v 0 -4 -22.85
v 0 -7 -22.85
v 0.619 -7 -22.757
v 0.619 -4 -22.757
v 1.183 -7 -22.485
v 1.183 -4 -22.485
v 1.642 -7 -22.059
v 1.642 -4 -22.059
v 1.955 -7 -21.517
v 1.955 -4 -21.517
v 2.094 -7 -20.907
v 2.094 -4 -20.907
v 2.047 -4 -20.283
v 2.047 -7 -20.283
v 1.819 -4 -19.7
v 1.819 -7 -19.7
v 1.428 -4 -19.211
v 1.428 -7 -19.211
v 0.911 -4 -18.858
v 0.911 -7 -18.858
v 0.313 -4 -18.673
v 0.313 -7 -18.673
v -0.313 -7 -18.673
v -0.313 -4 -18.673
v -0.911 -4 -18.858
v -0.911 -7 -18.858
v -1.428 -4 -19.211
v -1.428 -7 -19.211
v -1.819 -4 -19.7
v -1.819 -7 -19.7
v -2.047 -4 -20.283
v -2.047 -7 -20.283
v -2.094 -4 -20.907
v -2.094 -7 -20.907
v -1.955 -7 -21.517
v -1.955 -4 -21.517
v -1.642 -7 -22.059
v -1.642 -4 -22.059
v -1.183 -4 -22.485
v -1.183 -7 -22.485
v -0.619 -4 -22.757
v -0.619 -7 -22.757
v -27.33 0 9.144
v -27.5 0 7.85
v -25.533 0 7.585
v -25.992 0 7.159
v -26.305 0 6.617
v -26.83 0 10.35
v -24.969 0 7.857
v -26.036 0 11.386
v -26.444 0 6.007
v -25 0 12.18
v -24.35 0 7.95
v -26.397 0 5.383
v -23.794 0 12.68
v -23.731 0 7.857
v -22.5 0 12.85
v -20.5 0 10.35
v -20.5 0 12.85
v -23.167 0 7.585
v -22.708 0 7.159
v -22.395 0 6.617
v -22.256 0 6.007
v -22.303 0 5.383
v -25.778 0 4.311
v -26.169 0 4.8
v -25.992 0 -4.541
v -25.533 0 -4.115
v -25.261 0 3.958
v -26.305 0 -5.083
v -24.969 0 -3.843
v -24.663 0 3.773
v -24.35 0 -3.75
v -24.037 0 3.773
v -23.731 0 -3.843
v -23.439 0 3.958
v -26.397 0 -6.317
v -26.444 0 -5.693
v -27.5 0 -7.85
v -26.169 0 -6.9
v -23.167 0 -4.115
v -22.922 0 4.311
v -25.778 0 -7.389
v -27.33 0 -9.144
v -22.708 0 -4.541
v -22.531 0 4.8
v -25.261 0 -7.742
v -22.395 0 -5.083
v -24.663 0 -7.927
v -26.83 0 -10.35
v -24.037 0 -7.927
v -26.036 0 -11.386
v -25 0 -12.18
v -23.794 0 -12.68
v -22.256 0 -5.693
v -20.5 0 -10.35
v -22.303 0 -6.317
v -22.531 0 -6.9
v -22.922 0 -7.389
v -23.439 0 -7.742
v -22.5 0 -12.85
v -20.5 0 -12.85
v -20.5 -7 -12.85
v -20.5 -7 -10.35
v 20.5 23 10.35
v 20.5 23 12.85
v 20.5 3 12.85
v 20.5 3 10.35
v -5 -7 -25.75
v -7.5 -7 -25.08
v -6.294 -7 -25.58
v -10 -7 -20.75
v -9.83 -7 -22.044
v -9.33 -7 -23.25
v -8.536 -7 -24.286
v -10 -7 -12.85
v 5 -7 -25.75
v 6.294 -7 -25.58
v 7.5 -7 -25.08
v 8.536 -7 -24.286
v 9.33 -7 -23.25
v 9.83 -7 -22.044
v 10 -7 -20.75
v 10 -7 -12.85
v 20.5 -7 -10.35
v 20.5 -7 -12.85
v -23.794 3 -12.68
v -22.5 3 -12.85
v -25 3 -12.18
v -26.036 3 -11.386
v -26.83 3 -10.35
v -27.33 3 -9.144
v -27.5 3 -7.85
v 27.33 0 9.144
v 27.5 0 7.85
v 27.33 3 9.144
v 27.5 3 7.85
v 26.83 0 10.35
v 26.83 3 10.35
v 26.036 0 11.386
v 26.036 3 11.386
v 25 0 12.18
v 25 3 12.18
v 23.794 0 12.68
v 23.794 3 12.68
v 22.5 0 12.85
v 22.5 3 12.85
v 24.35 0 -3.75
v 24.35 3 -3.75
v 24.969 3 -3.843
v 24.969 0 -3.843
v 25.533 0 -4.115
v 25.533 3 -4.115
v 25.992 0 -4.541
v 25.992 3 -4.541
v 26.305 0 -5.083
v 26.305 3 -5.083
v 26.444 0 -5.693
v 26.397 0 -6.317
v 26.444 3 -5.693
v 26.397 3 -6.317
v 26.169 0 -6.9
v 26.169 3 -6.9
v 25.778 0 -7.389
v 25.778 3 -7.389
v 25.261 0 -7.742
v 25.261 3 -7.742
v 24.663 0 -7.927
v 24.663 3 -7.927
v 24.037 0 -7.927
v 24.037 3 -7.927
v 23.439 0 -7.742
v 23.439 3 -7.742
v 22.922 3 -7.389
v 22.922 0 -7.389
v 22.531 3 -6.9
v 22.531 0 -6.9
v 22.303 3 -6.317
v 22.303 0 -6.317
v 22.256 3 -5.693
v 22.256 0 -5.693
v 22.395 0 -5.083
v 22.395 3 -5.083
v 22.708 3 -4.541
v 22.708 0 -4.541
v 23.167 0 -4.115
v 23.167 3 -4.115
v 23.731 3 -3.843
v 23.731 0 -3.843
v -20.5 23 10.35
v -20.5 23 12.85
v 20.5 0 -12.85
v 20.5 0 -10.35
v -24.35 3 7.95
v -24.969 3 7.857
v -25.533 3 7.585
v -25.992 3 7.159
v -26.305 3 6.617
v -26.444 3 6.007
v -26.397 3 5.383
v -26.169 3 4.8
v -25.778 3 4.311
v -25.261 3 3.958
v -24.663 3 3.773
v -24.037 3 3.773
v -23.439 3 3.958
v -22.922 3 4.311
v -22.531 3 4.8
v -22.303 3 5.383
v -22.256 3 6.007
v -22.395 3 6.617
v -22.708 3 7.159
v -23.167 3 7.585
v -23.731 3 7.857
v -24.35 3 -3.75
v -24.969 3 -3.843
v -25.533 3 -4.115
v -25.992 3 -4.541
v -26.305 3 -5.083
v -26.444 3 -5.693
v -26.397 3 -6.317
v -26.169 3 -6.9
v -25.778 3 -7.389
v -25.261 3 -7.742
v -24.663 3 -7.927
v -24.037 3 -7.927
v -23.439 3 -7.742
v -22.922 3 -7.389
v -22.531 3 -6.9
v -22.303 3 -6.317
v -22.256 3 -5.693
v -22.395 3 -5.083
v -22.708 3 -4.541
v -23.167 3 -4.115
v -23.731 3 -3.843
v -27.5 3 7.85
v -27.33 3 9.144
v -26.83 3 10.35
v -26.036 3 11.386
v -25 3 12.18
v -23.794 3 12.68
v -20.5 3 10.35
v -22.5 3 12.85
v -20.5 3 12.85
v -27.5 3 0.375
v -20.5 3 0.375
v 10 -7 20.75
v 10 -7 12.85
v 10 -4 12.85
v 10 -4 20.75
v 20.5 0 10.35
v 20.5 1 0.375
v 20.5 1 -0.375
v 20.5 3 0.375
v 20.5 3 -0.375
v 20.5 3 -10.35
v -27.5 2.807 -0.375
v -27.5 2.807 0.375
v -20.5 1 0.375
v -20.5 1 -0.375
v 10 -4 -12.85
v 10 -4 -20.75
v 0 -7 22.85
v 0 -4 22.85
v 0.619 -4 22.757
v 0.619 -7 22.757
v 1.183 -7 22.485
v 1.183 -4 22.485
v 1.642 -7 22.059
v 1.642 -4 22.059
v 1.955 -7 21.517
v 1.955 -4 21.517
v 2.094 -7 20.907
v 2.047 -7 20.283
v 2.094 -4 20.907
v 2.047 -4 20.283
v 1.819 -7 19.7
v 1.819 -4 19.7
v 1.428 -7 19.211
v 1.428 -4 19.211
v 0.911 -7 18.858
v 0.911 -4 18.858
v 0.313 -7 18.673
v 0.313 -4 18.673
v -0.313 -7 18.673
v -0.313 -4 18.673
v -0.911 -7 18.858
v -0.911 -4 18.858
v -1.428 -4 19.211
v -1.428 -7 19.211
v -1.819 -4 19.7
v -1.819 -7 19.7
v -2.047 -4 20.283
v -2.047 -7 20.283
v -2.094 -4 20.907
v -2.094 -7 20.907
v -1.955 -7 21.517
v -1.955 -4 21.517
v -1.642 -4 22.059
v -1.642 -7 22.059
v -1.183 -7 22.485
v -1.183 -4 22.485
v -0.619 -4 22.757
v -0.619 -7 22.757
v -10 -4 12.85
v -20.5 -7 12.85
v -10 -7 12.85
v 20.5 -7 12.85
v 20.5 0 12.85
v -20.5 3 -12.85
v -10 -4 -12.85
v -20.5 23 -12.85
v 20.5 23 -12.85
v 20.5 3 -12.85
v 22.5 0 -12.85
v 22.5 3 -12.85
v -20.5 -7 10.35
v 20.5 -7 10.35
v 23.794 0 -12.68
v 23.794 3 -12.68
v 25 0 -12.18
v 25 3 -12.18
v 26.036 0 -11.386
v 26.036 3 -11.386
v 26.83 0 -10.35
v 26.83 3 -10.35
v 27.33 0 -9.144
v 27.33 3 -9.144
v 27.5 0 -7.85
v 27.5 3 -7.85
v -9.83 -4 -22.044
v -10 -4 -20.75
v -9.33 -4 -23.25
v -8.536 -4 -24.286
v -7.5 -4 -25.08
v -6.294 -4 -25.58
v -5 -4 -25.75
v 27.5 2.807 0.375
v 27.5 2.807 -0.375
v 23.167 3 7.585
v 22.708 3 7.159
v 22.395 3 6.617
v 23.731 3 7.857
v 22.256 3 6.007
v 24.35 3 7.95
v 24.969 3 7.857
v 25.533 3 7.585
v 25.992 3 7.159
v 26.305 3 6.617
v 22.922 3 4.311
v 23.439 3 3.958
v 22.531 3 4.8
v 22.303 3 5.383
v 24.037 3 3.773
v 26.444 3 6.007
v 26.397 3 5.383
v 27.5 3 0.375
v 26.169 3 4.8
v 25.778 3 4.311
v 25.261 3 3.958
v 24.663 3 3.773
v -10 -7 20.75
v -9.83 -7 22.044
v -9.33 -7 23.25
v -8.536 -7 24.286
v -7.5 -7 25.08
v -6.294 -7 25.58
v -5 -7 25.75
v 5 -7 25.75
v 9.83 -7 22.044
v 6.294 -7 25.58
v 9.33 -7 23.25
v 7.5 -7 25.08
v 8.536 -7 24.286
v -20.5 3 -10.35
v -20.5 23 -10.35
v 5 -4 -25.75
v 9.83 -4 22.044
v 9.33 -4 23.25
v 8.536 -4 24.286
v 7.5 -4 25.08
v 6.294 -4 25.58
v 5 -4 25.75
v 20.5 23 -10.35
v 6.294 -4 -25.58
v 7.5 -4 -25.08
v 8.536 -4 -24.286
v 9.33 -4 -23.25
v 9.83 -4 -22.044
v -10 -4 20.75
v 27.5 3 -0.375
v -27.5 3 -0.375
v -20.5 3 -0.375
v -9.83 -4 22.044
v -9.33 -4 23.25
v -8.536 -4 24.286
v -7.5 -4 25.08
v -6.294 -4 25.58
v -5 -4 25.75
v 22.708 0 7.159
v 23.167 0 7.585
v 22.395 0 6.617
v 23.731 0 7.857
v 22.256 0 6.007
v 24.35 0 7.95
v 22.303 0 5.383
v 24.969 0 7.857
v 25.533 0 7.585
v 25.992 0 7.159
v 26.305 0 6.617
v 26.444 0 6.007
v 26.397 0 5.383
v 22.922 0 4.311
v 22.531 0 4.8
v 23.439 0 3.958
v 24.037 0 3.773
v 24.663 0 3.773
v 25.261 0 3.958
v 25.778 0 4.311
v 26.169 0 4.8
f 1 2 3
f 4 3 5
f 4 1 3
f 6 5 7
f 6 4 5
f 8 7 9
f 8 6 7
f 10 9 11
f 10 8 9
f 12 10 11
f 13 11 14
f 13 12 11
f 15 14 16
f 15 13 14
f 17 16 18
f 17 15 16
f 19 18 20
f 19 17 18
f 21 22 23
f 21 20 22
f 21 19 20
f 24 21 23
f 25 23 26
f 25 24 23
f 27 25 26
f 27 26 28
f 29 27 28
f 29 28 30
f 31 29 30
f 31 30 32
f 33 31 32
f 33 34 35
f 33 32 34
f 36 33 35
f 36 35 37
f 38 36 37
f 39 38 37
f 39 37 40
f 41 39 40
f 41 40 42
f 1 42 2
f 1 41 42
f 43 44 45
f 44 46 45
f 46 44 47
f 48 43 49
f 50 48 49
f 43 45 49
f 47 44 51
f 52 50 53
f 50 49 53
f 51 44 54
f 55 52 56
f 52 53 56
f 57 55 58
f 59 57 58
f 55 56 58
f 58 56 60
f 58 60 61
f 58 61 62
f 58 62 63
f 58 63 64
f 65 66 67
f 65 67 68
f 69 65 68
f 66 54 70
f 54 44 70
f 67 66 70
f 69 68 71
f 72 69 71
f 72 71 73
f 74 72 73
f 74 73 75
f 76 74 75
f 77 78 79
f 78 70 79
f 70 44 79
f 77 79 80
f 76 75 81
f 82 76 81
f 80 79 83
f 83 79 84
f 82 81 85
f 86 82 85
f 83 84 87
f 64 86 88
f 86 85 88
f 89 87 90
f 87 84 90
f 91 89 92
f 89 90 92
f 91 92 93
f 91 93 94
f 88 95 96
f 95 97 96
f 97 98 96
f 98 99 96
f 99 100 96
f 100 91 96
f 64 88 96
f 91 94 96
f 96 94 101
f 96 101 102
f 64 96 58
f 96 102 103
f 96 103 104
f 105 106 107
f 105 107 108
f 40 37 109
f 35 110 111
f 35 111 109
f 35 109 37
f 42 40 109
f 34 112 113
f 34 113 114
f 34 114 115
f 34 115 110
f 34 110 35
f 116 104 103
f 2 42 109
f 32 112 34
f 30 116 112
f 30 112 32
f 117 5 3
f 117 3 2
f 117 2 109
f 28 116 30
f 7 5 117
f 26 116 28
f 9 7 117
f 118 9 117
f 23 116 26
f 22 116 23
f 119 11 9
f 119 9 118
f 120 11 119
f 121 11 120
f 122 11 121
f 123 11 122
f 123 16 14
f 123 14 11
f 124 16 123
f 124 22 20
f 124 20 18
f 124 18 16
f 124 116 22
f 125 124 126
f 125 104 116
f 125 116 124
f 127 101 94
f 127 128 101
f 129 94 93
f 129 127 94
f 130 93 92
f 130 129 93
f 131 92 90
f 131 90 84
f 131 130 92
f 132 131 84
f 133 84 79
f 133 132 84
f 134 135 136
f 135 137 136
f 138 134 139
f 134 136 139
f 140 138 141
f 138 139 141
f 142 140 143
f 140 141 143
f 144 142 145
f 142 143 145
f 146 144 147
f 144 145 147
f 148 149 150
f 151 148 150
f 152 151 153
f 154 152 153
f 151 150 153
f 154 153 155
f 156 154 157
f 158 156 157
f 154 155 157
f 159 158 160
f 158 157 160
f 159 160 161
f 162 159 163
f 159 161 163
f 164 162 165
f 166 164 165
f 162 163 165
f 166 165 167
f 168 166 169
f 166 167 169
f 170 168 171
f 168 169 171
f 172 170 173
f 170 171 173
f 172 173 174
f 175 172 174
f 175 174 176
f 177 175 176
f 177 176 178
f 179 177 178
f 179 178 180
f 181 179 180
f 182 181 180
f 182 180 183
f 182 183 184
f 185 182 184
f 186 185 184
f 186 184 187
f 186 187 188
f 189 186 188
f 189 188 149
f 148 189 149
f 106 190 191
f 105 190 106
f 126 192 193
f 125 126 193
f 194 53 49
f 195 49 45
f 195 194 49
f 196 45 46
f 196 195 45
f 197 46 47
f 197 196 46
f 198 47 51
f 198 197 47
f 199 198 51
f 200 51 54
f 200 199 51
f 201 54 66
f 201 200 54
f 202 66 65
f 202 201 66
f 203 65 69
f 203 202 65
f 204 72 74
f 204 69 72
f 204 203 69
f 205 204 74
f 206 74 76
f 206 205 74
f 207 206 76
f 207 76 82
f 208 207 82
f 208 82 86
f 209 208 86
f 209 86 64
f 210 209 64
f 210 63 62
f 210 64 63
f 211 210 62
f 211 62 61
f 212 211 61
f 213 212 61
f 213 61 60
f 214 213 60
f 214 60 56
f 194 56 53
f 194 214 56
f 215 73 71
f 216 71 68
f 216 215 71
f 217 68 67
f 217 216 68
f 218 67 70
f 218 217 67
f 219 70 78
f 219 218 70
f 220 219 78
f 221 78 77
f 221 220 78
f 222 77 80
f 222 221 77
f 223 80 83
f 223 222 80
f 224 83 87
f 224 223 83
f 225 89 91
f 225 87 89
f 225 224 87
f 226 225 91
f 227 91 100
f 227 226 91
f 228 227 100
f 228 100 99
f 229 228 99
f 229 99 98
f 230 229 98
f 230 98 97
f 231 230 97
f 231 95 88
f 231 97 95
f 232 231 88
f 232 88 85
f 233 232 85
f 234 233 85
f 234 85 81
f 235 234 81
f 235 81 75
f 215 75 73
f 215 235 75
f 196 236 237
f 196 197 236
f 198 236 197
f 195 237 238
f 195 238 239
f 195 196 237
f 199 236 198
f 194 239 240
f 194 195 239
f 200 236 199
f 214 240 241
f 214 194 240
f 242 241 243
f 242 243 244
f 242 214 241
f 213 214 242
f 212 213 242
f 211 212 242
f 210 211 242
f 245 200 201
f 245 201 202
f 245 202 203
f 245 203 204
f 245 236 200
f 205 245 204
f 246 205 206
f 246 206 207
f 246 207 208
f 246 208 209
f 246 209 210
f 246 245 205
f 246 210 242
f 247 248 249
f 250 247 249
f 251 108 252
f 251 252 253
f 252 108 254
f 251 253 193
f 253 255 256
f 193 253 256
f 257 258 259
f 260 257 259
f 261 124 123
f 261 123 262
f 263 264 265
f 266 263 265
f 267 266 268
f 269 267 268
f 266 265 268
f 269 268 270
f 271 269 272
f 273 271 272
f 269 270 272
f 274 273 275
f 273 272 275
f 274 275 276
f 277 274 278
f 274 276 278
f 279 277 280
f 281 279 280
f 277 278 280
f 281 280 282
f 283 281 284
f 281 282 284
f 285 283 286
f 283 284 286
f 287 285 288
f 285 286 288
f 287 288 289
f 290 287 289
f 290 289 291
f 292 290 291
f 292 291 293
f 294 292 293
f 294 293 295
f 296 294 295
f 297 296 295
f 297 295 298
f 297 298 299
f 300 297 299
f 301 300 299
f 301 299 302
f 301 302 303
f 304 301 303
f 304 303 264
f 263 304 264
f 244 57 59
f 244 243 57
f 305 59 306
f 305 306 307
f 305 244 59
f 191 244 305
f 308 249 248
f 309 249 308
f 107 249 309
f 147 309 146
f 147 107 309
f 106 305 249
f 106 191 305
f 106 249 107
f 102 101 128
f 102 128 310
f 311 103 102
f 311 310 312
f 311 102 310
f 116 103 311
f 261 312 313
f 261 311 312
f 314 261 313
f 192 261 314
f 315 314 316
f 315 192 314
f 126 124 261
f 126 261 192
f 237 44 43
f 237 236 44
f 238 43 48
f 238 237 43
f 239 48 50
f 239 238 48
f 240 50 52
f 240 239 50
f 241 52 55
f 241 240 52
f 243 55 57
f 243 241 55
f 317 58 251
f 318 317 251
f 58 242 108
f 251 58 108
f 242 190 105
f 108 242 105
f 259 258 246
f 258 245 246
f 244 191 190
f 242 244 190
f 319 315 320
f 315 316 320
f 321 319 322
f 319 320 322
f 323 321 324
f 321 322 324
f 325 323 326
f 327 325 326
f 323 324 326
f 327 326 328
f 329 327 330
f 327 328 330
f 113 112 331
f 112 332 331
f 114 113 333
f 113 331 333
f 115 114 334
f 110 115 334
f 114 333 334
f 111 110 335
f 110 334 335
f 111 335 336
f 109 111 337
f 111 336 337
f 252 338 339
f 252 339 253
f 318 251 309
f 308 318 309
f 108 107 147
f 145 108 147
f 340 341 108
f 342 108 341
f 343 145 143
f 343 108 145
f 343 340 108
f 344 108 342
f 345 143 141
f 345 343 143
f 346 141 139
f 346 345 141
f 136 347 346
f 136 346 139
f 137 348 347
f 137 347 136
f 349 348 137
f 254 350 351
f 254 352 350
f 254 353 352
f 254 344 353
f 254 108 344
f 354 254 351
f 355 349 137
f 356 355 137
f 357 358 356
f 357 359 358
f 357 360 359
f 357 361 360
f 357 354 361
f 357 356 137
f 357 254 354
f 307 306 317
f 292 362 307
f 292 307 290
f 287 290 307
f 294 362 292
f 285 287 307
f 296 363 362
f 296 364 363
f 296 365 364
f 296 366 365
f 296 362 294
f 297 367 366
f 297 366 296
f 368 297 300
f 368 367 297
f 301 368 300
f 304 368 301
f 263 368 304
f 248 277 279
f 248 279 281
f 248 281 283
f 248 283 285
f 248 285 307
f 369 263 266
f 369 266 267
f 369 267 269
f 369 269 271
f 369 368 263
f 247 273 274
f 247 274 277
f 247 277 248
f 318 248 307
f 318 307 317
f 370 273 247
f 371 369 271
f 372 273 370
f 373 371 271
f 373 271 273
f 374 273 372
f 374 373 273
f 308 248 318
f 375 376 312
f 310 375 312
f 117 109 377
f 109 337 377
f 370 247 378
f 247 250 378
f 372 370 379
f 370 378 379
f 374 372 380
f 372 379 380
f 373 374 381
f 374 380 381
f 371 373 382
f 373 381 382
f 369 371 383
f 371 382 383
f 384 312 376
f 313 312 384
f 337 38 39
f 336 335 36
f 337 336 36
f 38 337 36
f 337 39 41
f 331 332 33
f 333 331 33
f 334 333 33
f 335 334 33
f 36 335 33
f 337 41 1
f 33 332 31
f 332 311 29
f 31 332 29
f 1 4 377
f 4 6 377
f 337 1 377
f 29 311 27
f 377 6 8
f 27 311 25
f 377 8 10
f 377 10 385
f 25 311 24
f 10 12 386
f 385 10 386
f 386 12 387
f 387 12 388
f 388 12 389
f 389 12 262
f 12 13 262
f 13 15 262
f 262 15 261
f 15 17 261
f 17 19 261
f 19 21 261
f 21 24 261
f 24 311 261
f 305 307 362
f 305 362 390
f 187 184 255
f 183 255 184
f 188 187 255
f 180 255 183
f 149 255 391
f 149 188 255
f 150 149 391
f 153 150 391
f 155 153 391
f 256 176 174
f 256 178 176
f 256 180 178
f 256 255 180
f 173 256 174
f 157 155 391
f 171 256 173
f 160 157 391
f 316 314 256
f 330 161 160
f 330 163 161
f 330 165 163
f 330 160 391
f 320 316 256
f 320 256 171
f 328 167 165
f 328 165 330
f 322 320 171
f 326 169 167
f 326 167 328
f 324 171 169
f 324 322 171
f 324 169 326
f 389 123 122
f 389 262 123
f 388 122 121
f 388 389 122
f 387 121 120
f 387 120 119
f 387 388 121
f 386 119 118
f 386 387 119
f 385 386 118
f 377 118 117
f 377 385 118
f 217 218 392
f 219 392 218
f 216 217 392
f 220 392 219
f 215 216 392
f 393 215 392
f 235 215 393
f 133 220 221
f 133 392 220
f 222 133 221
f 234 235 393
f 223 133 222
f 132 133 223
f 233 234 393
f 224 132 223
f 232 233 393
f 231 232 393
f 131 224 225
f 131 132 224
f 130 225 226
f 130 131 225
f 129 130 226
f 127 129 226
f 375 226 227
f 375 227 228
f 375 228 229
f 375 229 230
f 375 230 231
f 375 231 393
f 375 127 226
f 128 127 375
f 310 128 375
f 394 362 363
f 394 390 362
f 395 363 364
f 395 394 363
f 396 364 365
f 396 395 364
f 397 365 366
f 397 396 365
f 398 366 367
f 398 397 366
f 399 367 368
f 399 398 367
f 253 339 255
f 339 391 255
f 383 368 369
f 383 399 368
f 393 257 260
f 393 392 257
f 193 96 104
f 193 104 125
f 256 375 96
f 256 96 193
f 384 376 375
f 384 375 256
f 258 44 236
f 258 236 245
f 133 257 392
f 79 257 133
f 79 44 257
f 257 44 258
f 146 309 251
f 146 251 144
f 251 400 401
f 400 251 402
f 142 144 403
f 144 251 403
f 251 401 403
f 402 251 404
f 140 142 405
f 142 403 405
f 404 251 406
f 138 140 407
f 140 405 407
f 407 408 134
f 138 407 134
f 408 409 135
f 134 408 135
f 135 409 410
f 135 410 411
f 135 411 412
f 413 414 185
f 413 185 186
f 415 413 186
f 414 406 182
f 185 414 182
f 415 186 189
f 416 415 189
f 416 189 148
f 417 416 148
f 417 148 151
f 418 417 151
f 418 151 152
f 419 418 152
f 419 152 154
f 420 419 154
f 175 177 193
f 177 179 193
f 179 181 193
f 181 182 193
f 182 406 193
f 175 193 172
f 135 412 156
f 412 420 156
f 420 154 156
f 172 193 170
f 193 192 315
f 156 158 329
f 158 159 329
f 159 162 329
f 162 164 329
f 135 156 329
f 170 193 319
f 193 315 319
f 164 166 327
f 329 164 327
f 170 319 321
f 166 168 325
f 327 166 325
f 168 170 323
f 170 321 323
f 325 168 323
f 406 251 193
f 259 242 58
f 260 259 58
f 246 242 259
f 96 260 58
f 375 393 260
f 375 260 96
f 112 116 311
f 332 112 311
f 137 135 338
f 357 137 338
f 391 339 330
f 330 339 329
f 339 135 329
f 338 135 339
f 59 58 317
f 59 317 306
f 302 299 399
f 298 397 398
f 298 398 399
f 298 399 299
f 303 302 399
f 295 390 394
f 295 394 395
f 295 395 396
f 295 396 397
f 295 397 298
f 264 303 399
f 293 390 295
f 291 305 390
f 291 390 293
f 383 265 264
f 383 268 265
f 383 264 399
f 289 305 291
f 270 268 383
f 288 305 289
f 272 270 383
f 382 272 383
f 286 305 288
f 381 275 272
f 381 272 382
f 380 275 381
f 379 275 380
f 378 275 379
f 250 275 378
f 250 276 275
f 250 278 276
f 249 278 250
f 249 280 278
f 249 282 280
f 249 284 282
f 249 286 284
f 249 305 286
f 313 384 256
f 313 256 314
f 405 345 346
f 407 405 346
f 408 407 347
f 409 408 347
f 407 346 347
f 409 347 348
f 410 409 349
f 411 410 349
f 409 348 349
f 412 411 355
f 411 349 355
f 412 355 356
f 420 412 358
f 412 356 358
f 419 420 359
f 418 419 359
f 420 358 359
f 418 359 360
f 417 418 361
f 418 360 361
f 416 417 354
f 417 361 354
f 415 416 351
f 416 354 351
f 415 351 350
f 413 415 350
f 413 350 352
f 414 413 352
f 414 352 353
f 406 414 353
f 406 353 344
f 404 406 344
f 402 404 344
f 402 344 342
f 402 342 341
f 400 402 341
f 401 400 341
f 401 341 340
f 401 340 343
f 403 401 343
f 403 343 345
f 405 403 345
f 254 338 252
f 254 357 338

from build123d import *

# Parameters (mm, degrees)
SKETCH1_W            = 55
SKETCH1_H            = 25.7
BOSS_EXTRUDE1_DEPTH  = 3
SKETCH2_W            = 41
SKETCH2_H            = 20.7
CUT_EXTRUDE1_DEPTH   = 31.502008131
SKETCH3_R            = 2.1
CUT_EXTRUDE2_DEPTH   = 31.502008131
SKETCH4_W            = 41
SKETCH4_H            = 2.5
BOSS_EXTRUDE2_DEPTH  = 20
CUT_EXTRUDE3_DEPTH   = 0.375
FILLET1_R            = 5
SKETCH6_W            = 41
SKETCH6_H            = 2.5
BOSS_EXTRUDE3_DEPTH  = 7
SKETCH7_W            = 20
SKETCH7_H            = 3
BOSS_EXTRUDE4_DEPTH  = 12.9
SKETCH8_R            = 2.1
CUT_EXTRUDE4_DEPTH   = 47.349892125
FILLET2_R            = 5
FILLET2_OF_MIRROR5_R = 5


with BuildPart() as part:
    # Sketch1 → Boss-Extrude1 (new body)
    with BuildSketch(Plane(origin=(0, 0, 0), x_dir=(1, 0, 0), z_dir=(0, 1, 0))):
        Rectangle(SKETCH1_W, SKETCH1_H)
    extrude(amount=BOSS_EXTRUDE1_DEPTH)

    # Sketch2 → Cut-Extrude1 (cut, through all)
    with BuildSketch(Plane(origin=(0, 3, 0), x_dir=(1, 0, 0), z_dir=(0, 1, 0))):
        Rectangle(SKETCH2_W, SKETCH2_H)
    extrude(amount=-CUT_EXTRUDE1_DEPTH, mode=Mode.SUBTRACT)

    # Sketch3 → Cut-Extrude2 (cut, through all)
    with BuildSketch(Plane(origin=(0, 3, 0), x_dir=(1, 0, 0), z_dir=(0, 1, 0))):
        with Locations(Location((24.35, 5.85, 0), (0, 0, 270))):
            Circle(SKETCH3_R)
        with Locations(Location((24.35, -5.85, 0), (0, 0, 270))):
            Circle(SKETCH3_R)
    cut_extrude2 = extrude(amount=-CUT_EXTRUDE2_DEPTH, mode=Mode.SUBTRACT)

    # Mirror1: Cut-Extrude2 across plane
    add(cut_extrude2.mirror(Plane(origin=(0, 0, 0), x_dir=(0, 0, 1), z_dir=(1, 0, 0))), mode=Mode.SUBTRACT)

    # Sketch4 → Boss-Extrude2 (add)
    with BuildSketch(Plane(origin=(0, 3, 0), x_dir=(1, 0, 0), z_dir=(0, 1, 0))):
        with Locations((0, 11.6)):
            Rectangle(SKETCH4_W, SKETCH4_H)
        with Locations((0, -11.6)):
            Rectangle(SKETCH4_W, SKETCH4_H)
    extrude(amount=BOSS_EXTRUDE2_DEPTH)

    # Sketch5 → Cut-Extrude3 (cut, symmetric)
    with BuildSketch(Plane.XY):
        Polygon((20.5, 1), (20.5, 3), (28.245966692, 3), align=None)
    cut_extrude3 = extrude(amount=CUT_EXTRUDE3_DEPTH, both=True, mode=Mode.SUBTRACT)

    # Mirror2: Cut-Extrude3 across plane
    add(cut_extrude3.mirror(Plane(origin=(0, 0, 0), x_dir=(0, 0, 1), z_dir=(1, 0, 0))), mode=Mode.SUBTRACT)

    # Fillet1
    fillet1_edges = [part.edges().sort_by_distance(p)[0] for p in [
        (-27.5, 1.5, -12.85),
        (27.5, 1.5, -12.85),
        (27.5, 1.5, 12.85),
        (-27.5, 1.5, 12.85),
    ]]
    fillet(fillet1_edges, radius=FILLET1_R)

    # Sketch6 → Boss-Extrude3 (add)
    with BuildSketch(Plane.XZ):
        with Locations((0, 11.6)):
            Rectangle(SKETCH6_W, SKETCH6_H)
        with Locations((0, -11.6)):
            Rectangle(SKETCH6_W, SKETCH6_H)
    extrude(amount=BOSS_EXTRUDE3_DEPTH)

    # Sketch7 → Boss-Extrude4 (add)
    with BuildSketch(Plane.XY.offset(12.85)):
        with Locations((0, -5.5)):
            Rectangle(SKETCH7_W, SKETCH7_H)
    boss_extrude4 = extrude(amount=BOSS_EXTRUDE4_DEPTH)

    # Sketch8 → Cut-Extrude4 (cut, through all)
    with BuildSketch(Plane(origin=(0, -4, 0), x_dir=(1, 0, 0), z_dir=(0, 1, 0))):
        with Locations(Location((0, -20.75, 0), (0, 0, 270))):
            Circle(SKETCH8_R)
    cut_extrude4 = extrude(amount=-CUT_EXTRUDE4_DEPTH, mode=Mode.SUBTRACT)

    # Fillet2
    fillet2_edges = [part.edges().sort_by_distance(p)[0] for p in [
        (-10, -5.5, 25.75),
        (10, -5.5, 25.75),
    ]]
    fillet(fillet2_edges, radius=FILLET2_R)

    # Mirror5: Boss-Extrude4, Cut-Extrude4 across plane
    add(boss_extrude4.mirror(Plane.XY))
    add(cut_extrude4.mirror(Plane.XY), mode=Mode.SUBTRACT)

    # Fillet2 of Mirror5
    fillet2_of_mirror5_edges = [part.edges().sort_by_distance(p)[0] for p in [
        (-10, -5.5, -25.75),
        (10, -5.5, -25.75),
    ]]
    fillet(fillet2_of_mirror5_edges, radius=FILLET2_OF_MIRROR5_R)


solid = part.part
